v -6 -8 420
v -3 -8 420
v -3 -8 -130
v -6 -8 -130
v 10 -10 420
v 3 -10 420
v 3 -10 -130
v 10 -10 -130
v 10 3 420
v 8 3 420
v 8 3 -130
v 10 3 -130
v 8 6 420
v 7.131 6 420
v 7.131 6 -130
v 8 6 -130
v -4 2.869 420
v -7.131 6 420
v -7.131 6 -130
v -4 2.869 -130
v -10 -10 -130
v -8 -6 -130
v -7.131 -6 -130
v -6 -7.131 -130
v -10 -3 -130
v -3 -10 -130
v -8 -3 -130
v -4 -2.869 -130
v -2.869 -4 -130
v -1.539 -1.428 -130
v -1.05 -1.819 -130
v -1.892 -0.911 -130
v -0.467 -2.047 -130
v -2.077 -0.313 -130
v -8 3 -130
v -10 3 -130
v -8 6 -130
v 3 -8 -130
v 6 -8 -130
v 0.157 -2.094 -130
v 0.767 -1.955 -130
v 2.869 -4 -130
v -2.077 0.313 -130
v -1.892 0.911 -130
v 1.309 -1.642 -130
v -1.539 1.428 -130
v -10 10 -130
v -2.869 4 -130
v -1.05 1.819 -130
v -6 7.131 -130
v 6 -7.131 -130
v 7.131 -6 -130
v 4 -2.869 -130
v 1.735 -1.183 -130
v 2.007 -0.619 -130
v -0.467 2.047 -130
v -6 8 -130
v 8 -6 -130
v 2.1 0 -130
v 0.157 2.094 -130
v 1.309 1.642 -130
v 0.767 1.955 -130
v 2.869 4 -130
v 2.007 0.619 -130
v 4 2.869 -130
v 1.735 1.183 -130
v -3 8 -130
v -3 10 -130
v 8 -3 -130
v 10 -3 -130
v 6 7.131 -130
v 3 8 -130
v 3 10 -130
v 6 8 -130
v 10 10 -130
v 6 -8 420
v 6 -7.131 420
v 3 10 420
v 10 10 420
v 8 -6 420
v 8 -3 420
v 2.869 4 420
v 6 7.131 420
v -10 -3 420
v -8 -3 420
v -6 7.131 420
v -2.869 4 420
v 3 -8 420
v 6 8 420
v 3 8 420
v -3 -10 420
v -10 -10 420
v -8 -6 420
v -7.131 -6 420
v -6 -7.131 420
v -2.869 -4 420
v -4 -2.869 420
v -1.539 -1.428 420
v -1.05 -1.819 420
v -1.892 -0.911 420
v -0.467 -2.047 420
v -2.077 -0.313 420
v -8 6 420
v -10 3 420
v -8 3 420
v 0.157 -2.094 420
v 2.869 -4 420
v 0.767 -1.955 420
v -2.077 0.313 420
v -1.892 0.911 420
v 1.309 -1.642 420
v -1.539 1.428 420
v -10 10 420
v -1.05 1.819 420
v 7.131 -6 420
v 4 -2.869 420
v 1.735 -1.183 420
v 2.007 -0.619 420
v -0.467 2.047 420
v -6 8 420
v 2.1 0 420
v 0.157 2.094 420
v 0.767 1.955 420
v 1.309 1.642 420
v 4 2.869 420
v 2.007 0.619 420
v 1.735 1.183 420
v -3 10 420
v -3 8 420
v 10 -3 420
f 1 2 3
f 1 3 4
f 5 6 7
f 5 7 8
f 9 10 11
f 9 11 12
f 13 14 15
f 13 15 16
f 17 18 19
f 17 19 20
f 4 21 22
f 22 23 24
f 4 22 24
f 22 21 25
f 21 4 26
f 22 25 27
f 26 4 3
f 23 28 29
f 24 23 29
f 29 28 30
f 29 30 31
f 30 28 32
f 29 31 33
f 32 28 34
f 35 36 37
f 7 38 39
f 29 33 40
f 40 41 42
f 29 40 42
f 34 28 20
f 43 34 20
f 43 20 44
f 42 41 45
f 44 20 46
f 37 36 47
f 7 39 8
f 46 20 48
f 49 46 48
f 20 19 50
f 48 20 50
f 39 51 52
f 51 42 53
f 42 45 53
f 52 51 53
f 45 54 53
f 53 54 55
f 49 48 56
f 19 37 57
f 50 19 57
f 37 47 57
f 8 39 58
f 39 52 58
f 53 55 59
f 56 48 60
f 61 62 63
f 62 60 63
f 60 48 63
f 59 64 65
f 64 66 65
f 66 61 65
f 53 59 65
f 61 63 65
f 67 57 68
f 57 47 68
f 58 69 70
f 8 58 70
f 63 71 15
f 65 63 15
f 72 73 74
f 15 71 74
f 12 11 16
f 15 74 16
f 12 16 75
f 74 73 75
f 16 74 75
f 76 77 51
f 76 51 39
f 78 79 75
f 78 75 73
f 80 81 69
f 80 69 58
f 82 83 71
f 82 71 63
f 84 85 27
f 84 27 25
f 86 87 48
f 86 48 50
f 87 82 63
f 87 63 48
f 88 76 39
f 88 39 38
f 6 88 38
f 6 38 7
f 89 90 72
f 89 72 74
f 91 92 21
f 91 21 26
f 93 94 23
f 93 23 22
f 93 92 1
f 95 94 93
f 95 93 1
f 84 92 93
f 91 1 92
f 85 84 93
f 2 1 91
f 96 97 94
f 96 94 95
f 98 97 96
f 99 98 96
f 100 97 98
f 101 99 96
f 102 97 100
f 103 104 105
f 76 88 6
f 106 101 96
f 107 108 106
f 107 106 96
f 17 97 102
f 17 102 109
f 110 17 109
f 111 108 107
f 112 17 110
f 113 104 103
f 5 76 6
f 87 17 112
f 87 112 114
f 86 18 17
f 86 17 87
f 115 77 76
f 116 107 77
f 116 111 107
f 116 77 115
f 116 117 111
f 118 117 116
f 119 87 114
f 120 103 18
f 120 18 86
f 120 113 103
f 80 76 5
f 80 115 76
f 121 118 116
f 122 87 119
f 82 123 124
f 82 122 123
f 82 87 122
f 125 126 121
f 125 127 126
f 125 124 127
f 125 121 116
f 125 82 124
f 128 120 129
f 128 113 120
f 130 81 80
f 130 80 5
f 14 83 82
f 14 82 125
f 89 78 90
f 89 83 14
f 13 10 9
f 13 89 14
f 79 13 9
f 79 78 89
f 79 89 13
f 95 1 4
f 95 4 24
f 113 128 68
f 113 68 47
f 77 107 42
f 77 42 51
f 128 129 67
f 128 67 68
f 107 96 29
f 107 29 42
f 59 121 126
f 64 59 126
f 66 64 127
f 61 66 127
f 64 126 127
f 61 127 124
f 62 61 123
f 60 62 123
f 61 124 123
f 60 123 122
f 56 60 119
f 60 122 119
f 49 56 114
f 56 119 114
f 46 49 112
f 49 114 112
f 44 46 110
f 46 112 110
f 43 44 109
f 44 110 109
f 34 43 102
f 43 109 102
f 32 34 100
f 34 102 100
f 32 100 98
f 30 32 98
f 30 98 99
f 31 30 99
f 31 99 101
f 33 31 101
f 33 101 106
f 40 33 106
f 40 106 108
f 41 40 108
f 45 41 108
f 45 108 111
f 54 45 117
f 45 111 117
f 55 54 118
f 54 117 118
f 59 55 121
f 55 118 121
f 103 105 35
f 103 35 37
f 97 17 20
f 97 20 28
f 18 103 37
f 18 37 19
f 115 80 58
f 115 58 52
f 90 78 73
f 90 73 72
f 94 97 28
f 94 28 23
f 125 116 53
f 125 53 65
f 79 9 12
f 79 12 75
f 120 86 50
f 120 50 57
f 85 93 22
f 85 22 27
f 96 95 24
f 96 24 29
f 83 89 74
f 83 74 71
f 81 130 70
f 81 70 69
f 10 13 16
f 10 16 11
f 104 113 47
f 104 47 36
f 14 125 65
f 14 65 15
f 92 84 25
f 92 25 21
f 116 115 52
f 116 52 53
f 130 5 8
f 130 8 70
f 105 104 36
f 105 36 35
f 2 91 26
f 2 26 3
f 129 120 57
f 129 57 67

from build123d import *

# Parameters (mm, degrees)
CROQUIS1_R              = 2.1
SALIENTE_EXTRUIR1_DEPTH = 550


with BuildPart() as part:
    # Croquis1 → Saliente-Extruir1 (new body)
    with BuildSketch(Plane.XY.offset(420)):
        Polygon((-10, 10), (-10, 3), (-8, 3), (-8, 6), (-7.13137085, 6), (-4, 2.86862915), (-4, -2.86862915), (-7.13137085, -6), (-8, -6), (-8, -3), (-10, -3), (-10, -10), (-3, -10), (-3, -8), (-6, -8), (-6, -7.13137085), (-2.86862915, -4), (2.86862915, -4), (6, -7.13137085), (6, -8), (3, -8), (3, -10), (10, -10), (10, -3), (8, -3), (8, -6), (7.13137085, -6), (4, -2.86862915), (4, 2.86862915), (7.13137085, 6), (8, 6), (8, 3), (10, 3), (10, 10), (3, 10), (3, 8), (6, 8), (6, 7.13137085), (2.86862915, 4), (-2.86862915, 4), (-6, 7.13137085), (-6, 8), (-3, 8), (-3, 10), align=None)
        Circle(CROQUIS1_R, mode=Mode.SUBTRACT)
    extrude(amount=-SALIENTE_EXTRUIR1_DEPTH)


solid = part.part
